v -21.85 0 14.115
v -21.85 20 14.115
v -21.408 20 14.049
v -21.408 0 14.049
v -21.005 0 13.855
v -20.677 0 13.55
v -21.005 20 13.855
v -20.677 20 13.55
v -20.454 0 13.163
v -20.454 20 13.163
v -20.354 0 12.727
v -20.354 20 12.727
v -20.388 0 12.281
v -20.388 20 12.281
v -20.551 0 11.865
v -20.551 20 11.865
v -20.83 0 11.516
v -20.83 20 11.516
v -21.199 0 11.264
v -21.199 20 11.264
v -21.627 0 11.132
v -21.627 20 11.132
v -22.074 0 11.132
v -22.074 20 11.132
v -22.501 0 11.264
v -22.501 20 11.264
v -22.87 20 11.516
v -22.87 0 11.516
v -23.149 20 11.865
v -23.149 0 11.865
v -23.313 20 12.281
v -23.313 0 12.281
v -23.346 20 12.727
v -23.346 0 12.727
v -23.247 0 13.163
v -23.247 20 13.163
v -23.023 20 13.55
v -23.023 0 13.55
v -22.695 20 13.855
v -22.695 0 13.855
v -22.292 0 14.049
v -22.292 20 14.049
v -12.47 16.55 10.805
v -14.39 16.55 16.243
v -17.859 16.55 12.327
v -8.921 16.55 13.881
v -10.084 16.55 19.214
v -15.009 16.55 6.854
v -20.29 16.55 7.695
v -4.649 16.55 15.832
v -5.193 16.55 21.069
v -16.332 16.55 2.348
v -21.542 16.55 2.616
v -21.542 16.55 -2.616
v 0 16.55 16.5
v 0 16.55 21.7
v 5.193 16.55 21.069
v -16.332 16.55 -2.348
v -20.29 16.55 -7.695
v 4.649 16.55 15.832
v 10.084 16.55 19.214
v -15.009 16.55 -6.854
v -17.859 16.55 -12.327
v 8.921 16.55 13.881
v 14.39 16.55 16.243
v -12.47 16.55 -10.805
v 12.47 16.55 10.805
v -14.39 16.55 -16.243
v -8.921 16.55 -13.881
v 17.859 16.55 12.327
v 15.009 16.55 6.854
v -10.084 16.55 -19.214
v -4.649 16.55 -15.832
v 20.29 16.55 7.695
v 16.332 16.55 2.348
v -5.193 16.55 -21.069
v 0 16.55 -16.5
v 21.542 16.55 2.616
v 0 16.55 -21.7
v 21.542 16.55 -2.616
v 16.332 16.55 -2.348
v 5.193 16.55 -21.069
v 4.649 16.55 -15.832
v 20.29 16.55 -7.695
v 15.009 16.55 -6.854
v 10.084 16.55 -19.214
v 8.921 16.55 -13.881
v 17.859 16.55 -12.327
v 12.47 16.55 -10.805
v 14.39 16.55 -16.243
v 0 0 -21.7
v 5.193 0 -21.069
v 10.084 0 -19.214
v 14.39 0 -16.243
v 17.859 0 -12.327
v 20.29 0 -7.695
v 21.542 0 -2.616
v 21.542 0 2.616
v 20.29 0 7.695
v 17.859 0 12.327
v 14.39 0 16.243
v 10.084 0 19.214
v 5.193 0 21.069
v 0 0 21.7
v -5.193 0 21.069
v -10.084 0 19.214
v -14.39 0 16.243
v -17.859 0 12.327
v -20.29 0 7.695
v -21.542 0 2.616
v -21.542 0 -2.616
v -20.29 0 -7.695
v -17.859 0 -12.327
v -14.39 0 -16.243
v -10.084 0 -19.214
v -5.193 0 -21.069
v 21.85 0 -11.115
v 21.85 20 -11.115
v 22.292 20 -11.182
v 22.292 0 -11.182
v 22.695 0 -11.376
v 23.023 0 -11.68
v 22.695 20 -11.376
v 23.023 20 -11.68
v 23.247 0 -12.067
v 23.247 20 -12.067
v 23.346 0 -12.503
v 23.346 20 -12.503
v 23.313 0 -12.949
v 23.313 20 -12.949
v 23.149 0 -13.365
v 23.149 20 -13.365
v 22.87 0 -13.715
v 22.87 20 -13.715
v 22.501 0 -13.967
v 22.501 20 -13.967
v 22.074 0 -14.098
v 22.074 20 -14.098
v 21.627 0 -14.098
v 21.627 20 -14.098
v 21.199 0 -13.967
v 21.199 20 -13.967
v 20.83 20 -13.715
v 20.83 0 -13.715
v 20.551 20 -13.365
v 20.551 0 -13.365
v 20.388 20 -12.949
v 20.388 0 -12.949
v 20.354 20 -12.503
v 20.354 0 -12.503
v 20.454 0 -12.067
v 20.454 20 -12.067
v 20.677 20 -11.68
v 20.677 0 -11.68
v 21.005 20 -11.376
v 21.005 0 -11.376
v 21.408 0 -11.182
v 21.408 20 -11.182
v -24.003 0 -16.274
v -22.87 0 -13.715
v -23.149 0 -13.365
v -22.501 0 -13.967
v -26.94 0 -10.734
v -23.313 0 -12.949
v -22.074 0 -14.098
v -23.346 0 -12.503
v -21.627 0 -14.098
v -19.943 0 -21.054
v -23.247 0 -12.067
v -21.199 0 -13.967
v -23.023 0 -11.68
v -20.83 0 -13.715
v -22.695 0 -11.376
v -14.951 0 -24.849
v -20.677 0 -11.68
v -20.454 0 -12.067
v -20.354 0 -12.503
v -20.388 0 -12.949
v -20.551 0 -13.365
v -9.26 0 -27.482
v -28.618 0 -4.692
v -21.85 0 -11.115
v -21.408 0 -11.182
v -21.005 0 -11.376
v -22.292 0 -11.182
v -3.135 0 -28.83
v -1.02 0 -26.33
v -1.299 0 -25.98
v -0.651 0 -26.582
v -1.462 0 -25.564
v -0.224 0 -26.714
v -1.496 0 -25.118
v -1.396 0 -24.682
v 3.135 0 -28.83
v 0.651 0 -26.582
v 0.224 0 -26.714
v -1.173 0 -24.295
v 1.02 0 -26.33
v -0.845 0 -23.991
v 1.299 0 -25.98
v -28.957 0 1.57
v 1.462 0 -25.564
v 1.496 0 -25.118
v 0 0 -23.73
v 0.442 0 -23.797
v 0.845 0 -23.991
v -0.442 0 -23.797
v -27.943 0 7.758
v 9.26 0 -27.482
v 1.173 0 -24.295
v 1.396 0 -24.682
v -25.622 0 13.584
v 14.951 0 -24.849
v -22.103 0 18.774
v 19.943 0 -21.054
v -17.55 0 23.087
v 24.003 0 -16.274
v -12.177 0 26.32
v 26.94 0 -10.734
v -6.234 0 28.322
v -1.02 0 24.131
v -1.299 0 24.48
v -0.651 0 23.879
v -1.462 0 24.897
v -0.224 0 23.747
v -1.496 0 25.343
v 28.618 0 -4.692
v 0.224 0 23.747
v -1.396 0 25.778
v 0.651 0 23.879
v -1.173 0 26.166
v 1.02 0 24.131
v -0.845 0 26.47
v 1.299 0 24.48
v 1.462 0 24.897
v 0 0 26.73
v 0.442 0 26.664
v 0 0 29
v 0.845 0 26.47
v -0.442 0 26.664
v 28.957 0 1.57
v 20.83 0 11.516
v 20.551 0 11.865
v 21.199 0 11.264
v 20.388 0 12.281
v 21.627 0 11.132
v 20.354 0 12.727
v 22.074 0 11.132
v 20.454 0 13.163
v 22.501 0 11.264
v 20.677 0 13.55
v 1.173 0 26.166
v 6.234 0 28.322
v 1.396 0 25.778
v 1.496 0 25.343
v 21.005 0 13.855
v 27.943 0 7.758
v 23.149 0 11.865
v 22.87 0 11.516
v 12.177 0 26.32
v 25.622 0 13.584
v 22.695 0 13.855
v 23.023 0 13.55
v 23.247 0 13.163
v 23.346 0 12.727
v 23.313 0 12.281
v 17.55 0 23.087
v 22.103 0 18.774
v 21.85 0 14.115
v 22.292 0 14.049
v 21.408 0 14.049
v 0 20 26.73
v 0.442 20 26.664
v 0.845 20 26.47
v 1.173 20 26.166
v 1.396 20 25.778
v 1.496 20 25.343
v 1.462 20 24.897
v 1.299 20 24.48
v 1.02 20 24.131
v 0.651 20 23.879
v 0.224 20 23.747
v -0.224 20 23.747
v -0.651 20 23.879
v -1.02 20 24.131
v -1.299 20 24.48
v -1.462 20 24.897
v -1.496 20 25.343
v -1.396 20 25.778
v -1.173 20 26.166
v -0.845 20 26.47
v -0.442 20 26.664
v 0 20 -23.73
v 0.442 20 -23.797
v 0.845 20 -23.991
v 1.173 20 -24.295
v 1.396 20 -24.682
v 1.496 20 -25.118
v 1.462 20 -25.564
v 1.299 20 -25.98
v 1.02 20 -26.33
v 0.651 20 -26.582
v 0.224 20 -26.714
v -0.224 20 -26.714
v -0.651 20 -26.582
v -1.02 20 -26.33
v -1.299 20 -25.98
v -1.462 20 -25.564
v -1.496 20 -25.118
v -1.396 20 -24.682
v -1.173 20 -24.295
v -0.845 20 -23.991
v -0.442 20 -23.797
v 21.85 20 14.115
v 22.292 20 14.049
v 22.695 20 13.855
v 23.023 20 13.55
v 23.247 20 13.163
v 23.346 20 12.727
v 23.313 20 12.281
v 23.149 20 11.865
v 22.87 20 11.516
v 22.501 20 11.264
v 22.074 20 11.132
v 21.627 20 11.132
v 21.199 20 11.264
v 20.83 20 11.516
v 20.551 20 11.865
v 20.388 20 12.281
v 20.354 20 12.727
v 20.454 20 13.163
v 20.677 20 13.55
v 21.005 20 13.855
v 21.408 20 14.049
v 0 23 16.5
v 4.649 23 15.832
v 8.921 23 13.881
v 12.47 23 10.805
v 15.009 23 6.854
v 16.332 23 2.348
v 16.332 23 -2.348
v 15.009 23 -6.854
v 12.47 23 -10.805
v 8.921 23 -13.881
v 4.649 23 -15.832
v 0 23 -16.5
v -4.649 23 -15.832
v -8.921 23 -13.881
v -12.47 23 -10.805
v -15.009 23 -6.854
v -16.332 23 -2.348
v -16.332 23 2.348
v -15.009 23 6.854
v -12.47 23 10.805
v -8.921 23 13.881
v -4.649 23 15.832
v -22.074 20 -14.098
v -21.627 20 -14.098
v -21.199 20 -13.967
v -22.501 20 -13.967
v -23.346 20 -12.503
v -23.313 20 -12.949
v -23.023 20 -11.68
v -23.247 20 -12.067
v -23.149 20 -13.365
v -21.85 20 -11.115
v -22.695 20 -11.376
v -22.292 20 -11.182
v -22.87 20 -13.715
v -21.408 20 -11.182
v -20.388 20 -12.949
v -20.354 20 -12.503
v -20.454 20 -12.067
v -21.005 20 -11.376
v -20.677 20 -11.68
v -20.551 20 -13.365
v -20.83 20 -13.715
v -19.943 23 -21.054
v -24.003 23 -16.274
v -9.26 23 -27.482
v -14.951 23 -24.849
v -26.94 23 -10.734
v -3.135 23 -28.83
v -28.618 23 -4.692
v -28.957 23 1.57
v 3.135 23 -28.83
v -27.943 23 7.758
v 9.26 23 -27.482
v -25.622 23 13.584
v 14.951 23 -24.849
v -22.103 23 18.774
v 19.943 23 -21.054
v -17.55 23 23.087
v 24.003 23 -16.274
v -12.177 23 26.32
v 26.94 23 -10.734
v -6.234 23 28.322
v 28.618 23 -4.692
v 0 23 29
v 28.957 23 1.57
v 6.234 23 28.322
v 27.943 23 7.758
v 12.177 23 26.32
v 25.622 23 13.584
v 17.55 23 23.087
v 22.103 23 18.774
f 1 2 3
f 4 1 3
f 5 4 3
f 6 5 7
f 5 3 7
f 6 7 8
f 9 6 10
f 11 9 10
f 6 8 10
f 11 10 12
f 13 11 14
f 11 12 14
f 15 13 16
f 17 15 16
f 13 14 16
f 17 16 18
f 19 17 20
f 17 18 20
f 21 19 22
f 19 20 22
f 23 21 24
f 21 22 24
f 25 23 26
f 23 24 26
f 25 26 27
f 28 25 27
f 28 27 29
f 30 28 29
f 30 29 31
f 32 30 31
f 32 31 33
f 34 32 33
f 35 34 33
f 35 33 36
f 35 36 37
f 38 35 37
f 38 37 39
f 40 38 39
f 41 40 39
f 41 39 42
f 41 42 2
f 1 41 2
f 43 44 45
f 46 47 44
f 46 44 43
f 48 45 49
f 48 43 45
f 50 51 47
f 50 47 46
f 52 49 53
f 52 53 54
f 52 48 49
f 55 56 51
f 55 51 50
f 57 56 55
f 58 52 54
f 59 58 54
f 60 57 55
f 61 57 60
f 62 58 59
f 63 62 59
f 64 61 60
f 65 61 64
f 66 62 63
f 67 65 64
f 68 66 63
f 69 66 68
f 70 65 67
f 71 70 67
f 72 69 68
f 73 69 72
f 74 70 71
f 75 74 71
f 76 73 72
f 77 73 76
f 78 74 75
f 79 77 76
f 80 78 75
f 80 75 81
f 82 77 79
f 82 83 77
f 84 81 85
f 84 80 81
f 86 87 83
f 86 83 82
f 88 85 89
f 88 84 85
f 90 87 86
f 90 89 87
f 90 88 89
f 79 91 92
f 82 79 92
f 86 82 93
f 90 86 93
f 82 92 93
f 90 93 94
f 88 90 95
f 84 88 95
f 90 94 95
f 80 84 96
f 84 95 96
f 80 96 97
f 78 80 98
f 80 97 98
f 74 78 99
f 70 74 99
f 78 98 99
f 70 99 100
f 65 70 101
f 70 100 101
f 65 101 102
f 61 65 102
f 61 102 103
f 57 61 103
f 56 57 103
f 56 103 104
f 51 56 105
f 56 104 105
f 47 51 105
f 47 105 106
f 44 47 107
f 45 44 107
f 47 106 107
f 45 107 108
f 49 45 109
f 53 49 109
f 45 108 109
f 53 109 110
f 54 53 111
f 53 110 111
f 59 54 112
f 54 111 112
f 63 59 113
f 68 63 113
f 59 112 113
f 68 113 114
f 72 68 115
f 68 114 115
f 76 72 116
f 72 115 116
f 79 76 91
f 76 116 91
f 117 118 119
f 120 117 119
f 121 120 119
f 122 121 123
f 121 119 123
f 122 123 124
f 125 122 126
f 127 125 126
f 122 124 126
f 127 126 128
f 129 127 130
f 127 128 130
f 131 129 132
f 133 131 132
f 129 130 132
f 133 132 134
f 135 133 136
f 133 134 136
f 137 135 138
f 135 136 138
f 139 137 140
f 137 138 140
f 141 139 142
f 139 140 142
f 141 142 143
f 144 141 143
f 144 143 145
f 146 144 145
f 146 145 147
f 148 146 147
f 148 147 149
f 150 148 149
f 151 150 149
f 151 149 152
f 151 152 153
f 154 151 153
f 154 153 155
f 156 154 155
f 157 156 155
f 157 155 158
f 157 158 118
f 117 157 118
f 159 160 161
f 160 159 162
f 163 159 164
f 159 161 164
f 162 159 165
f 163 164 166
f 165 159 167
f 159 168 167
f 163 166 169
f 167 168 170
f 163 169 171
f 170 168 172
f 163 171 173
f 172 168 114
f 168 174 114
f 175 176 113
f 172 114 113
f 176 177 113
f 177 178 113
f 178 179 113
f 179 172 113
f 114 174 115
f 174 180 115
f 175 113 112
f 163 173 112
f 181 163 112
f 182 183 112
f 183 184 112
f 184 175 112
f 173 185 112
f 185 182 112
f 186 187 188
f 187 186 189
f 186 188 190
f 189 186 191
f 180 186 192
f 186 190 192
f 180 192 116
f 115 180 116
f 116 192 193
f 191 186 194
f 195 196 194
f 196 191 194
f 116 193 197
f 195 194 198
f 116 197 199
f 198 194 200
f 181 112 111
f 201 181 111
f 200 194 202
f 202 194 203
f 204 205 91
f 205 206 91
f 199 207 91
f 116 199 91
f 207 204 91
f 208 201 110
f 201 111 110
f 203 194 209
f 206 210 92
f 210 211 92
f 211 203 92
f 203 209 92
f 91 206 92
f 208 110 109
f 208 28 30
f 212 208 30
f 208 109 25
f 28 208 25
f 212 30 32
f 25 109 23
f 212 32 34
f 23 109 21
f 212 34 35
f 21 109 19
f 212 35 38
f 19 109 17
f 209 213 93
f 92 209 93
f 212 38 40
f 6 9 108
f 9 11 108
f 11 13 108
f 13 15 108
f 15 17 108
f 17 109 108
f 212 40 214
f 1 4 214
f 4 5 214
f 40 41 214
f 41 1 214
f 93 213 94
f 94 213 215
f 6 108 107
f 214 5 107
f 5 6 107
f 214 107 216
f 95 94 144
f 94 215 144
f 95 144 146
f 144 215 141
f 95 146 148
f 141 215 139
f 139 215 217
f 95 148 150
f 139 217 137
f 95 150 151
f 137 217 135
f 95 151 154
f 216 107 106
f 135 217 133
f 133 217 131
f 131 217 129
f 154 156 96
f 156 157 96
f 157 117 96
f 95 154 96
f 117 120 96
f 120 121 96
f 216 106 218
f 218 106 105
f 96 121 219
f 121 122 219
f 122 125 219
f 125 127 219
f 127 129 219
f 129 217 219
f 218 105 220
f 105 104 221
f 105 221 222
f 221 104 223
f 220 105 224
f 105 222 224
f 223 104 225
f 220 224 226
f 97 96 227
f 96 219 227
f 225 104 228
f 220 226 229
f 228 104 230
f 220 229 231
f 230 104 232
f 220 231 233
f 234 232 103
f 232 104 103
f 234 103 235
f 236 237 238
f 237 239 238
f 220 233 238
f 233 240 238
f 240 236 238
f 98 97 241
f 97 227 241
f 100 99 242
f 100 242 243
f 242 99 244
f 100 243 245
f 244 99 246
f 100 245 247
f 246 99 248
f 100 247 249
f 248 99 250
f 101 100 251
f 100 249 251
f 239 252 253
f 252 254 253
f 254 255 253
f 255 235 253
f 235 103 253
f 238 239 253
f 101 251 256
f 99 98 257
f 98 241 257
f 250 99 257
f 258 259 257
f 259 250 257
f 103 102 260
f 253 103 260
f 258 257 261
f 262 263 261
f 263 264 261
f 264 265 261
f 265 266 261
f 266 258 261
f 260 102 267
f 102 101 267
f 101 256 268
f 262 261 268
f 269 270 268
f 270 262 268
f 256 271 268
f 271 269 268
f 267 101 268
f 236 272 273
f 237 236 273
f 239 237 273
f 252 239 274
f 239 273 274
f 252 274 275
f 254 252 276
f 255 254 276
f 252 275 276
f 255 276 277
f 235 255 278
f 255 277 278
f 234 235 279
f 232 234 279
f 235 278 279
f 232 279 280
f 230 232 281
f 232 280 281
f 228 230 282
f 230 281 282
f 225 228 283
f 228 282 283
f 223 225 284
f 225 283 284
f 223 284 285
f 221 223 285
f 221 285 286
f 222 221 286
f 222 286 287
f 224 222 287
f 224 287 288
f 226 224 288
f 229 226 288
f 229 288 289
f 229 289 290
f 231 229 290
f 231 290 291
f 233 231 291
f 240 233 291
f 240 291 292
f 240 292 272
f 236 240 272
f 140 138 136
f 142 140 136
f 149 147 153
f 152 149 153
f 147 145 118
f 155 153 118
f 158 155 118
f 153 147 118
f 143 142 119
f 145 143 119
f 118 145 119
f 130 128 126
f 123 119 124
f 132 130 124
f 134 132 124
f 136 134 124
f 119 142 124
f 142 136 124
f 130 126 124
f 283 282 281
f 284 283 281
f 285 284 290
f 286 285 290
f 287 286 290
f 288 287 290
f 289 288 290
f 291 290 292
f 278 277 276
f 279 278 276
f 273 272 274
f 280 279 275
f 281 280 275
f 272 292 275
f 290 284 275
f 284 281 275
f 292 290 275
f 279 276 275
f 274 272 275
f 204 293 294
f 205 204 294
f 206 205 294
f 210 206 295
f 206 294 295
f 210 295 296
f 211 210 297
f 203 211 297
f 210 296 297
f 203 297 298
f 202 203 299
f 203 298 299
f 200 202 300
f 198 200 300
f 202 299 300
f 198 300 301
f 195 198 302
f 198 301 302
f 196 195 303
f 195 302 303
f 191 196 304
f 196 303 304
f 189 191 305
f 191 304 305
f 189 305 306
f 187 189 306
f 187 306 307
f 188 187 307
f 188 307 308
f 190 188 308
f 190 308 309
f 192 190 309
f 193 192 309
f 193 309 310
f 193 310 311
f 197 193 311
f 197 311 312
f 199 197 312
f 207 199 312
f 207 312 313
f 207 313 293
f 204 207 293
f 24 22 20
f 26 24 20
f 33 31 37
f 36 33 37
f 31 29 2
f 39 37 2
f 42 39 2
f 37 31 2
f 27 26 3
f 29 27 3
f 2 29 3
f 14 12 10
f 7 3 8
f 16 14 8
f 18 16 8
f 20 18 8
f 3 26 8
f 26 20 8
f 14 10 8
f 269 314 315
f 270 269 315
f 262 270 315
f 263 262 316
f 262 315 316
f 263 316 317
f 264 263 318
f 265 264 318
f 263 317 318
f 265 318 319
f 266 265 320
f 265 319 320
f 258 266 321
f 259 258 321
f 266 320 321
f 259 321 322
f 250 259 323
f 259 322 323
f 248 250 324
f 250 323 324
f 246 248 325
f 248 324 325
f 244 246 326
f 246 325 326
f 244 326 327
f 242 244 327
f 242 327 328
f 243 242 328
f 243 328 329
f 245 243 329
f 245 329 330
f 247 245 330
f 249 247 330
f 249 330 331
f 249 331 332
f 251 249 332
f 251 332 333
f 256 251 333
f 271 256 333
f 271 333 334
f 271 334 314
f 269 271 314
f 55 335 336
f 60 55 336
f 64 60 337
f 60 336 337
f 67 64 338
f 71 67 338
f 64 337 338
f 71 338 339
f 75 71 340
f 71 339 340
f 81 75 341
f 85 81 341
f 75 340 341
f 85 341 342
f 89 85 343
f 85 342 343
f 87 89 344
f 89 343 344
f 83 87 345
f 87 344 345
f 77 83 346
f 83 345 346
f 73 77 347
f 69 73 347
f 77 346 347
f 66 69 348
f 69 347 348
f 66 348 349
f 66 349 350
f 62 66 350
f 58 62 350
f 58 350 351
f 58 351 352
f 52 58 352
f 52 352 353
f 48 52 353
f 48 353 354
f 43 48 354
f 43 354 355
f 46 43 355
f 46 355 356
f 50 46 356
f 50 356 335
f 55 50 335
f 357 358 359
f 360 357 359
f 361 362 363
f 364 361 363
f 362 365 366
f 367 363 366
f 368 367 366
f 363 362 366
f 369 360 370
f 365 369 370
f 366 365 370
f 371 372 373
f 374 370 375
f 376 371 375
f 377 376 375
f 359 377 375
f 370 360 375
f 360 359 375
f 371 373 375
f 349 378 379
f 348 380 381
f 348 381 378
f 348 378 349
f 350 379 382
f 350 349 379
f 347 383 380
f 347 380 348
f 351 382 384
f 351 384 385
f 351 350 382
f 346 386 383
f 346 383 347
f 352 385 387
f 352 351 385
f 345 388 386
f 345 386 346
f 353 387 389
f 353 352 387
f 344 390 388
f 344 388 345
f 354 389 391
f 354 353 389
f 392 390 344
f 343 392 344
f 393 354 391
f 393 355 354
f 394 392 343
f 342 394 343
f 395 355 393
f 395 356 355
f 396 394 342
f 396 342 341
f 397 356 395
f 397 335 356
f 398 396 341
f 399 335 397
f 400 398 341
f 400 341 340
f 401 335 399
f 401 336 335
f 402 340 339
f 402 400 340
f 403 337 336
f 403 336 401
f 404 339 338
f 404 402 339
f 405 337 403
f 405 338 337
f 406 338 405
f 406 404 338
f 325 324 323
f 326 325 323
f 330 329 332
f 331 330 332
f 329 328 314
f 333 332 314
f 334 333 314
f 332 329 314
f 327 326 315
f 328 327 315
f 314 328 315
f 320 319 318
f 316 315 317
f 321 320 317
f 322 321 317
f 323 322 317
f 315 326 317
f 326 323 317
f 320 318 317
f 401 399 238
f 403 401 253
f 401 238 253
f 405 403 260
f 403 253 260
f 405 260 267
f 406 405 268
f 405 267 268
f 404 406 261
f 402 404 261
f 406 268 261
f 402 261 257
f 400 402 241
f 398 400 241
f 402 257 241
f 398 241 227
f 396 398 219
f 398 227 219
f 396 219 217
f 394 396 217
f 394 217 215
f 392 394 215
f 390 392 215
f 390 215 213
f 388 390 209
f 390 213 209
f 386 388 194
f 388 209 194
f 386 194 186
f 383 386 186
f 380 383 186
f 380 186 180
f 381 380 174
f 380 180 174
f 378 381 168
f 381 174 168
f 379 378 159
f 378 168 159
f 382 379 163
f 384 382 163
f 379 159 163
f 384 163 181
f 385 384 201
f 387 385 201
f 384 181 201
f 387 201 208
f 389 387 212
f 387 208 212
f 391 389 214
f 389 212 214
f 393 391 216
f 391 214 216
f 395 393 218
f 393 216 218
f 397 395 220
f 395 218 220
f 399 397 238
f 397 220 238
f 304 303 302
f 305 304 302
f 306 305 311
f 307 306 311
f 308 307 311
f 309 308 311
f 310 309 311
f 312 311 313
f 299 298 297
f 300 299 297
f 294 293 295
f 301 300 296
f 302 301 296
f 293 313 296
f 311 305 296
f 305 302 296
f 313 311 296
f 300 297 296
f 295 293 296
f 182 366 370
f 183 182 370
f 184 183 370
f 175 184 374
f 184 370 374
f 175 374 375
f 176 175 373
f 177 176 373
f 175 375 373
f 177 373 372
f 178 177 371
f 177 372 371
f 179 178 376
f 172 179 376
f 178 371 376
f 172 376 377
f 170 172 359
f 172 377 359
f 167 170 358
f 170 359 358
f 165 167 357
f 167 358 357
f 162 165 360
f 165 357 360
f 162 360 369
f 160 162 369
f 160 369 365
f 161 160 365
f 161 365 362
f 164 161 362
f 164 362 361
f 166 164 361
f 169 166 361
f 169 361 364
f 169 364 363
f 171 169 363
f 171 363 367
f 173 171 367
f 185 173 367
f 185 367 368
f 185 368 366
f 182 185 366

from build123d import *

# Parameters (mm, degrees)
SKETCH2_R          = 29
EXTRUDE1_DEPTH     = 23
SKETCH3_R          = 21.7
CUT_EXTRUDE1_DEPTH = 16.55
SKETCH4_R          = 16.5
CUT_EXTRUDE2_DEPTH = 48.021271782
CUT_EXTRUDE3_START = -3
SKETCH5_R          = 1.5
CUT_EXTRUDE3_DEPTH = 45.021271782


with BuildPart() as part:
    # Sketch2 → Extrude1 (new body)
    with BuildSketch(Plane(origin=(0, 0, 0), x_dir=(1, 0, 0), z_dir=(0, 1, 0))):
        with Locations(Location((0, 0, 0), (0, 0, 270))):
            Circle(SKETCH2_R)
    extrude(amount=EXTRUDE1_DEPTH)

    # Sketch3 → Cut-Extrude1 (cut)
    with BuildSketch(Plane.XZ):
        with Locations(Location((0, 0, 0), (0, 0, 270))):
            Circle(SKETCH3_R)
    extrude(amount=-CUT_EXTRUDE1_DEPTH, mode=Mode.SUBTRACT)

    # Sketch4 → Cut-Extrude2 (cut, through all)
    with BuildSketch(Plane(origin=(0, 23, 0), x_dir=(1, 0, 0), z_dir=(0, 1, 0))):
        with Locations(Location((0, 0, 0), (0, 0, 270))):
            Circle(SKETCH4_R)
    extrude(amount=-CUT_EXTRUDE2_DEPTH, mode=Mode.SUBTRACT)

    # Sketch5 → Cut-Extrude3 (cut, through all)
    with BuildSketch(Plane(origin=(0, 23, 0), x_dir=(1, 0, 0), z_dir=(0, 1, 0)).offset(CUT_EXTRUDE3_START)):
        with Locations(Location((0, 25.230472928, 0), (0, 0, 270))):
            Circle(SKETCH5_R)
        with Locations(Location((21.850230505, 12.615236464, 0), (0, 0, 270))):
            Circle(SKETCH5_R)
        with Locations(Location((21.850230505, -12.615236464, 0), (0, 0, 270))):
            Circle(SKETCH5_R)
        with Locations(Location((0, -25.230472928, 0), (0, 0, 270))):
            Circle(SKETCH5_R)
        with Locations(Location((-21.850230505, -12.615236464, 0), (0, 0, 270))):
            Circle(SKETCH5_R)
        with Locations(Location((-21.850230505, 12.615236464, 0), (0, 0, 270))):
            Circle(SKETCH5_R)
    extrude(amount=-CUT_EXTRUDE3_DEPTH, mode=Mode.SUBTRACT)


solid = part.part
